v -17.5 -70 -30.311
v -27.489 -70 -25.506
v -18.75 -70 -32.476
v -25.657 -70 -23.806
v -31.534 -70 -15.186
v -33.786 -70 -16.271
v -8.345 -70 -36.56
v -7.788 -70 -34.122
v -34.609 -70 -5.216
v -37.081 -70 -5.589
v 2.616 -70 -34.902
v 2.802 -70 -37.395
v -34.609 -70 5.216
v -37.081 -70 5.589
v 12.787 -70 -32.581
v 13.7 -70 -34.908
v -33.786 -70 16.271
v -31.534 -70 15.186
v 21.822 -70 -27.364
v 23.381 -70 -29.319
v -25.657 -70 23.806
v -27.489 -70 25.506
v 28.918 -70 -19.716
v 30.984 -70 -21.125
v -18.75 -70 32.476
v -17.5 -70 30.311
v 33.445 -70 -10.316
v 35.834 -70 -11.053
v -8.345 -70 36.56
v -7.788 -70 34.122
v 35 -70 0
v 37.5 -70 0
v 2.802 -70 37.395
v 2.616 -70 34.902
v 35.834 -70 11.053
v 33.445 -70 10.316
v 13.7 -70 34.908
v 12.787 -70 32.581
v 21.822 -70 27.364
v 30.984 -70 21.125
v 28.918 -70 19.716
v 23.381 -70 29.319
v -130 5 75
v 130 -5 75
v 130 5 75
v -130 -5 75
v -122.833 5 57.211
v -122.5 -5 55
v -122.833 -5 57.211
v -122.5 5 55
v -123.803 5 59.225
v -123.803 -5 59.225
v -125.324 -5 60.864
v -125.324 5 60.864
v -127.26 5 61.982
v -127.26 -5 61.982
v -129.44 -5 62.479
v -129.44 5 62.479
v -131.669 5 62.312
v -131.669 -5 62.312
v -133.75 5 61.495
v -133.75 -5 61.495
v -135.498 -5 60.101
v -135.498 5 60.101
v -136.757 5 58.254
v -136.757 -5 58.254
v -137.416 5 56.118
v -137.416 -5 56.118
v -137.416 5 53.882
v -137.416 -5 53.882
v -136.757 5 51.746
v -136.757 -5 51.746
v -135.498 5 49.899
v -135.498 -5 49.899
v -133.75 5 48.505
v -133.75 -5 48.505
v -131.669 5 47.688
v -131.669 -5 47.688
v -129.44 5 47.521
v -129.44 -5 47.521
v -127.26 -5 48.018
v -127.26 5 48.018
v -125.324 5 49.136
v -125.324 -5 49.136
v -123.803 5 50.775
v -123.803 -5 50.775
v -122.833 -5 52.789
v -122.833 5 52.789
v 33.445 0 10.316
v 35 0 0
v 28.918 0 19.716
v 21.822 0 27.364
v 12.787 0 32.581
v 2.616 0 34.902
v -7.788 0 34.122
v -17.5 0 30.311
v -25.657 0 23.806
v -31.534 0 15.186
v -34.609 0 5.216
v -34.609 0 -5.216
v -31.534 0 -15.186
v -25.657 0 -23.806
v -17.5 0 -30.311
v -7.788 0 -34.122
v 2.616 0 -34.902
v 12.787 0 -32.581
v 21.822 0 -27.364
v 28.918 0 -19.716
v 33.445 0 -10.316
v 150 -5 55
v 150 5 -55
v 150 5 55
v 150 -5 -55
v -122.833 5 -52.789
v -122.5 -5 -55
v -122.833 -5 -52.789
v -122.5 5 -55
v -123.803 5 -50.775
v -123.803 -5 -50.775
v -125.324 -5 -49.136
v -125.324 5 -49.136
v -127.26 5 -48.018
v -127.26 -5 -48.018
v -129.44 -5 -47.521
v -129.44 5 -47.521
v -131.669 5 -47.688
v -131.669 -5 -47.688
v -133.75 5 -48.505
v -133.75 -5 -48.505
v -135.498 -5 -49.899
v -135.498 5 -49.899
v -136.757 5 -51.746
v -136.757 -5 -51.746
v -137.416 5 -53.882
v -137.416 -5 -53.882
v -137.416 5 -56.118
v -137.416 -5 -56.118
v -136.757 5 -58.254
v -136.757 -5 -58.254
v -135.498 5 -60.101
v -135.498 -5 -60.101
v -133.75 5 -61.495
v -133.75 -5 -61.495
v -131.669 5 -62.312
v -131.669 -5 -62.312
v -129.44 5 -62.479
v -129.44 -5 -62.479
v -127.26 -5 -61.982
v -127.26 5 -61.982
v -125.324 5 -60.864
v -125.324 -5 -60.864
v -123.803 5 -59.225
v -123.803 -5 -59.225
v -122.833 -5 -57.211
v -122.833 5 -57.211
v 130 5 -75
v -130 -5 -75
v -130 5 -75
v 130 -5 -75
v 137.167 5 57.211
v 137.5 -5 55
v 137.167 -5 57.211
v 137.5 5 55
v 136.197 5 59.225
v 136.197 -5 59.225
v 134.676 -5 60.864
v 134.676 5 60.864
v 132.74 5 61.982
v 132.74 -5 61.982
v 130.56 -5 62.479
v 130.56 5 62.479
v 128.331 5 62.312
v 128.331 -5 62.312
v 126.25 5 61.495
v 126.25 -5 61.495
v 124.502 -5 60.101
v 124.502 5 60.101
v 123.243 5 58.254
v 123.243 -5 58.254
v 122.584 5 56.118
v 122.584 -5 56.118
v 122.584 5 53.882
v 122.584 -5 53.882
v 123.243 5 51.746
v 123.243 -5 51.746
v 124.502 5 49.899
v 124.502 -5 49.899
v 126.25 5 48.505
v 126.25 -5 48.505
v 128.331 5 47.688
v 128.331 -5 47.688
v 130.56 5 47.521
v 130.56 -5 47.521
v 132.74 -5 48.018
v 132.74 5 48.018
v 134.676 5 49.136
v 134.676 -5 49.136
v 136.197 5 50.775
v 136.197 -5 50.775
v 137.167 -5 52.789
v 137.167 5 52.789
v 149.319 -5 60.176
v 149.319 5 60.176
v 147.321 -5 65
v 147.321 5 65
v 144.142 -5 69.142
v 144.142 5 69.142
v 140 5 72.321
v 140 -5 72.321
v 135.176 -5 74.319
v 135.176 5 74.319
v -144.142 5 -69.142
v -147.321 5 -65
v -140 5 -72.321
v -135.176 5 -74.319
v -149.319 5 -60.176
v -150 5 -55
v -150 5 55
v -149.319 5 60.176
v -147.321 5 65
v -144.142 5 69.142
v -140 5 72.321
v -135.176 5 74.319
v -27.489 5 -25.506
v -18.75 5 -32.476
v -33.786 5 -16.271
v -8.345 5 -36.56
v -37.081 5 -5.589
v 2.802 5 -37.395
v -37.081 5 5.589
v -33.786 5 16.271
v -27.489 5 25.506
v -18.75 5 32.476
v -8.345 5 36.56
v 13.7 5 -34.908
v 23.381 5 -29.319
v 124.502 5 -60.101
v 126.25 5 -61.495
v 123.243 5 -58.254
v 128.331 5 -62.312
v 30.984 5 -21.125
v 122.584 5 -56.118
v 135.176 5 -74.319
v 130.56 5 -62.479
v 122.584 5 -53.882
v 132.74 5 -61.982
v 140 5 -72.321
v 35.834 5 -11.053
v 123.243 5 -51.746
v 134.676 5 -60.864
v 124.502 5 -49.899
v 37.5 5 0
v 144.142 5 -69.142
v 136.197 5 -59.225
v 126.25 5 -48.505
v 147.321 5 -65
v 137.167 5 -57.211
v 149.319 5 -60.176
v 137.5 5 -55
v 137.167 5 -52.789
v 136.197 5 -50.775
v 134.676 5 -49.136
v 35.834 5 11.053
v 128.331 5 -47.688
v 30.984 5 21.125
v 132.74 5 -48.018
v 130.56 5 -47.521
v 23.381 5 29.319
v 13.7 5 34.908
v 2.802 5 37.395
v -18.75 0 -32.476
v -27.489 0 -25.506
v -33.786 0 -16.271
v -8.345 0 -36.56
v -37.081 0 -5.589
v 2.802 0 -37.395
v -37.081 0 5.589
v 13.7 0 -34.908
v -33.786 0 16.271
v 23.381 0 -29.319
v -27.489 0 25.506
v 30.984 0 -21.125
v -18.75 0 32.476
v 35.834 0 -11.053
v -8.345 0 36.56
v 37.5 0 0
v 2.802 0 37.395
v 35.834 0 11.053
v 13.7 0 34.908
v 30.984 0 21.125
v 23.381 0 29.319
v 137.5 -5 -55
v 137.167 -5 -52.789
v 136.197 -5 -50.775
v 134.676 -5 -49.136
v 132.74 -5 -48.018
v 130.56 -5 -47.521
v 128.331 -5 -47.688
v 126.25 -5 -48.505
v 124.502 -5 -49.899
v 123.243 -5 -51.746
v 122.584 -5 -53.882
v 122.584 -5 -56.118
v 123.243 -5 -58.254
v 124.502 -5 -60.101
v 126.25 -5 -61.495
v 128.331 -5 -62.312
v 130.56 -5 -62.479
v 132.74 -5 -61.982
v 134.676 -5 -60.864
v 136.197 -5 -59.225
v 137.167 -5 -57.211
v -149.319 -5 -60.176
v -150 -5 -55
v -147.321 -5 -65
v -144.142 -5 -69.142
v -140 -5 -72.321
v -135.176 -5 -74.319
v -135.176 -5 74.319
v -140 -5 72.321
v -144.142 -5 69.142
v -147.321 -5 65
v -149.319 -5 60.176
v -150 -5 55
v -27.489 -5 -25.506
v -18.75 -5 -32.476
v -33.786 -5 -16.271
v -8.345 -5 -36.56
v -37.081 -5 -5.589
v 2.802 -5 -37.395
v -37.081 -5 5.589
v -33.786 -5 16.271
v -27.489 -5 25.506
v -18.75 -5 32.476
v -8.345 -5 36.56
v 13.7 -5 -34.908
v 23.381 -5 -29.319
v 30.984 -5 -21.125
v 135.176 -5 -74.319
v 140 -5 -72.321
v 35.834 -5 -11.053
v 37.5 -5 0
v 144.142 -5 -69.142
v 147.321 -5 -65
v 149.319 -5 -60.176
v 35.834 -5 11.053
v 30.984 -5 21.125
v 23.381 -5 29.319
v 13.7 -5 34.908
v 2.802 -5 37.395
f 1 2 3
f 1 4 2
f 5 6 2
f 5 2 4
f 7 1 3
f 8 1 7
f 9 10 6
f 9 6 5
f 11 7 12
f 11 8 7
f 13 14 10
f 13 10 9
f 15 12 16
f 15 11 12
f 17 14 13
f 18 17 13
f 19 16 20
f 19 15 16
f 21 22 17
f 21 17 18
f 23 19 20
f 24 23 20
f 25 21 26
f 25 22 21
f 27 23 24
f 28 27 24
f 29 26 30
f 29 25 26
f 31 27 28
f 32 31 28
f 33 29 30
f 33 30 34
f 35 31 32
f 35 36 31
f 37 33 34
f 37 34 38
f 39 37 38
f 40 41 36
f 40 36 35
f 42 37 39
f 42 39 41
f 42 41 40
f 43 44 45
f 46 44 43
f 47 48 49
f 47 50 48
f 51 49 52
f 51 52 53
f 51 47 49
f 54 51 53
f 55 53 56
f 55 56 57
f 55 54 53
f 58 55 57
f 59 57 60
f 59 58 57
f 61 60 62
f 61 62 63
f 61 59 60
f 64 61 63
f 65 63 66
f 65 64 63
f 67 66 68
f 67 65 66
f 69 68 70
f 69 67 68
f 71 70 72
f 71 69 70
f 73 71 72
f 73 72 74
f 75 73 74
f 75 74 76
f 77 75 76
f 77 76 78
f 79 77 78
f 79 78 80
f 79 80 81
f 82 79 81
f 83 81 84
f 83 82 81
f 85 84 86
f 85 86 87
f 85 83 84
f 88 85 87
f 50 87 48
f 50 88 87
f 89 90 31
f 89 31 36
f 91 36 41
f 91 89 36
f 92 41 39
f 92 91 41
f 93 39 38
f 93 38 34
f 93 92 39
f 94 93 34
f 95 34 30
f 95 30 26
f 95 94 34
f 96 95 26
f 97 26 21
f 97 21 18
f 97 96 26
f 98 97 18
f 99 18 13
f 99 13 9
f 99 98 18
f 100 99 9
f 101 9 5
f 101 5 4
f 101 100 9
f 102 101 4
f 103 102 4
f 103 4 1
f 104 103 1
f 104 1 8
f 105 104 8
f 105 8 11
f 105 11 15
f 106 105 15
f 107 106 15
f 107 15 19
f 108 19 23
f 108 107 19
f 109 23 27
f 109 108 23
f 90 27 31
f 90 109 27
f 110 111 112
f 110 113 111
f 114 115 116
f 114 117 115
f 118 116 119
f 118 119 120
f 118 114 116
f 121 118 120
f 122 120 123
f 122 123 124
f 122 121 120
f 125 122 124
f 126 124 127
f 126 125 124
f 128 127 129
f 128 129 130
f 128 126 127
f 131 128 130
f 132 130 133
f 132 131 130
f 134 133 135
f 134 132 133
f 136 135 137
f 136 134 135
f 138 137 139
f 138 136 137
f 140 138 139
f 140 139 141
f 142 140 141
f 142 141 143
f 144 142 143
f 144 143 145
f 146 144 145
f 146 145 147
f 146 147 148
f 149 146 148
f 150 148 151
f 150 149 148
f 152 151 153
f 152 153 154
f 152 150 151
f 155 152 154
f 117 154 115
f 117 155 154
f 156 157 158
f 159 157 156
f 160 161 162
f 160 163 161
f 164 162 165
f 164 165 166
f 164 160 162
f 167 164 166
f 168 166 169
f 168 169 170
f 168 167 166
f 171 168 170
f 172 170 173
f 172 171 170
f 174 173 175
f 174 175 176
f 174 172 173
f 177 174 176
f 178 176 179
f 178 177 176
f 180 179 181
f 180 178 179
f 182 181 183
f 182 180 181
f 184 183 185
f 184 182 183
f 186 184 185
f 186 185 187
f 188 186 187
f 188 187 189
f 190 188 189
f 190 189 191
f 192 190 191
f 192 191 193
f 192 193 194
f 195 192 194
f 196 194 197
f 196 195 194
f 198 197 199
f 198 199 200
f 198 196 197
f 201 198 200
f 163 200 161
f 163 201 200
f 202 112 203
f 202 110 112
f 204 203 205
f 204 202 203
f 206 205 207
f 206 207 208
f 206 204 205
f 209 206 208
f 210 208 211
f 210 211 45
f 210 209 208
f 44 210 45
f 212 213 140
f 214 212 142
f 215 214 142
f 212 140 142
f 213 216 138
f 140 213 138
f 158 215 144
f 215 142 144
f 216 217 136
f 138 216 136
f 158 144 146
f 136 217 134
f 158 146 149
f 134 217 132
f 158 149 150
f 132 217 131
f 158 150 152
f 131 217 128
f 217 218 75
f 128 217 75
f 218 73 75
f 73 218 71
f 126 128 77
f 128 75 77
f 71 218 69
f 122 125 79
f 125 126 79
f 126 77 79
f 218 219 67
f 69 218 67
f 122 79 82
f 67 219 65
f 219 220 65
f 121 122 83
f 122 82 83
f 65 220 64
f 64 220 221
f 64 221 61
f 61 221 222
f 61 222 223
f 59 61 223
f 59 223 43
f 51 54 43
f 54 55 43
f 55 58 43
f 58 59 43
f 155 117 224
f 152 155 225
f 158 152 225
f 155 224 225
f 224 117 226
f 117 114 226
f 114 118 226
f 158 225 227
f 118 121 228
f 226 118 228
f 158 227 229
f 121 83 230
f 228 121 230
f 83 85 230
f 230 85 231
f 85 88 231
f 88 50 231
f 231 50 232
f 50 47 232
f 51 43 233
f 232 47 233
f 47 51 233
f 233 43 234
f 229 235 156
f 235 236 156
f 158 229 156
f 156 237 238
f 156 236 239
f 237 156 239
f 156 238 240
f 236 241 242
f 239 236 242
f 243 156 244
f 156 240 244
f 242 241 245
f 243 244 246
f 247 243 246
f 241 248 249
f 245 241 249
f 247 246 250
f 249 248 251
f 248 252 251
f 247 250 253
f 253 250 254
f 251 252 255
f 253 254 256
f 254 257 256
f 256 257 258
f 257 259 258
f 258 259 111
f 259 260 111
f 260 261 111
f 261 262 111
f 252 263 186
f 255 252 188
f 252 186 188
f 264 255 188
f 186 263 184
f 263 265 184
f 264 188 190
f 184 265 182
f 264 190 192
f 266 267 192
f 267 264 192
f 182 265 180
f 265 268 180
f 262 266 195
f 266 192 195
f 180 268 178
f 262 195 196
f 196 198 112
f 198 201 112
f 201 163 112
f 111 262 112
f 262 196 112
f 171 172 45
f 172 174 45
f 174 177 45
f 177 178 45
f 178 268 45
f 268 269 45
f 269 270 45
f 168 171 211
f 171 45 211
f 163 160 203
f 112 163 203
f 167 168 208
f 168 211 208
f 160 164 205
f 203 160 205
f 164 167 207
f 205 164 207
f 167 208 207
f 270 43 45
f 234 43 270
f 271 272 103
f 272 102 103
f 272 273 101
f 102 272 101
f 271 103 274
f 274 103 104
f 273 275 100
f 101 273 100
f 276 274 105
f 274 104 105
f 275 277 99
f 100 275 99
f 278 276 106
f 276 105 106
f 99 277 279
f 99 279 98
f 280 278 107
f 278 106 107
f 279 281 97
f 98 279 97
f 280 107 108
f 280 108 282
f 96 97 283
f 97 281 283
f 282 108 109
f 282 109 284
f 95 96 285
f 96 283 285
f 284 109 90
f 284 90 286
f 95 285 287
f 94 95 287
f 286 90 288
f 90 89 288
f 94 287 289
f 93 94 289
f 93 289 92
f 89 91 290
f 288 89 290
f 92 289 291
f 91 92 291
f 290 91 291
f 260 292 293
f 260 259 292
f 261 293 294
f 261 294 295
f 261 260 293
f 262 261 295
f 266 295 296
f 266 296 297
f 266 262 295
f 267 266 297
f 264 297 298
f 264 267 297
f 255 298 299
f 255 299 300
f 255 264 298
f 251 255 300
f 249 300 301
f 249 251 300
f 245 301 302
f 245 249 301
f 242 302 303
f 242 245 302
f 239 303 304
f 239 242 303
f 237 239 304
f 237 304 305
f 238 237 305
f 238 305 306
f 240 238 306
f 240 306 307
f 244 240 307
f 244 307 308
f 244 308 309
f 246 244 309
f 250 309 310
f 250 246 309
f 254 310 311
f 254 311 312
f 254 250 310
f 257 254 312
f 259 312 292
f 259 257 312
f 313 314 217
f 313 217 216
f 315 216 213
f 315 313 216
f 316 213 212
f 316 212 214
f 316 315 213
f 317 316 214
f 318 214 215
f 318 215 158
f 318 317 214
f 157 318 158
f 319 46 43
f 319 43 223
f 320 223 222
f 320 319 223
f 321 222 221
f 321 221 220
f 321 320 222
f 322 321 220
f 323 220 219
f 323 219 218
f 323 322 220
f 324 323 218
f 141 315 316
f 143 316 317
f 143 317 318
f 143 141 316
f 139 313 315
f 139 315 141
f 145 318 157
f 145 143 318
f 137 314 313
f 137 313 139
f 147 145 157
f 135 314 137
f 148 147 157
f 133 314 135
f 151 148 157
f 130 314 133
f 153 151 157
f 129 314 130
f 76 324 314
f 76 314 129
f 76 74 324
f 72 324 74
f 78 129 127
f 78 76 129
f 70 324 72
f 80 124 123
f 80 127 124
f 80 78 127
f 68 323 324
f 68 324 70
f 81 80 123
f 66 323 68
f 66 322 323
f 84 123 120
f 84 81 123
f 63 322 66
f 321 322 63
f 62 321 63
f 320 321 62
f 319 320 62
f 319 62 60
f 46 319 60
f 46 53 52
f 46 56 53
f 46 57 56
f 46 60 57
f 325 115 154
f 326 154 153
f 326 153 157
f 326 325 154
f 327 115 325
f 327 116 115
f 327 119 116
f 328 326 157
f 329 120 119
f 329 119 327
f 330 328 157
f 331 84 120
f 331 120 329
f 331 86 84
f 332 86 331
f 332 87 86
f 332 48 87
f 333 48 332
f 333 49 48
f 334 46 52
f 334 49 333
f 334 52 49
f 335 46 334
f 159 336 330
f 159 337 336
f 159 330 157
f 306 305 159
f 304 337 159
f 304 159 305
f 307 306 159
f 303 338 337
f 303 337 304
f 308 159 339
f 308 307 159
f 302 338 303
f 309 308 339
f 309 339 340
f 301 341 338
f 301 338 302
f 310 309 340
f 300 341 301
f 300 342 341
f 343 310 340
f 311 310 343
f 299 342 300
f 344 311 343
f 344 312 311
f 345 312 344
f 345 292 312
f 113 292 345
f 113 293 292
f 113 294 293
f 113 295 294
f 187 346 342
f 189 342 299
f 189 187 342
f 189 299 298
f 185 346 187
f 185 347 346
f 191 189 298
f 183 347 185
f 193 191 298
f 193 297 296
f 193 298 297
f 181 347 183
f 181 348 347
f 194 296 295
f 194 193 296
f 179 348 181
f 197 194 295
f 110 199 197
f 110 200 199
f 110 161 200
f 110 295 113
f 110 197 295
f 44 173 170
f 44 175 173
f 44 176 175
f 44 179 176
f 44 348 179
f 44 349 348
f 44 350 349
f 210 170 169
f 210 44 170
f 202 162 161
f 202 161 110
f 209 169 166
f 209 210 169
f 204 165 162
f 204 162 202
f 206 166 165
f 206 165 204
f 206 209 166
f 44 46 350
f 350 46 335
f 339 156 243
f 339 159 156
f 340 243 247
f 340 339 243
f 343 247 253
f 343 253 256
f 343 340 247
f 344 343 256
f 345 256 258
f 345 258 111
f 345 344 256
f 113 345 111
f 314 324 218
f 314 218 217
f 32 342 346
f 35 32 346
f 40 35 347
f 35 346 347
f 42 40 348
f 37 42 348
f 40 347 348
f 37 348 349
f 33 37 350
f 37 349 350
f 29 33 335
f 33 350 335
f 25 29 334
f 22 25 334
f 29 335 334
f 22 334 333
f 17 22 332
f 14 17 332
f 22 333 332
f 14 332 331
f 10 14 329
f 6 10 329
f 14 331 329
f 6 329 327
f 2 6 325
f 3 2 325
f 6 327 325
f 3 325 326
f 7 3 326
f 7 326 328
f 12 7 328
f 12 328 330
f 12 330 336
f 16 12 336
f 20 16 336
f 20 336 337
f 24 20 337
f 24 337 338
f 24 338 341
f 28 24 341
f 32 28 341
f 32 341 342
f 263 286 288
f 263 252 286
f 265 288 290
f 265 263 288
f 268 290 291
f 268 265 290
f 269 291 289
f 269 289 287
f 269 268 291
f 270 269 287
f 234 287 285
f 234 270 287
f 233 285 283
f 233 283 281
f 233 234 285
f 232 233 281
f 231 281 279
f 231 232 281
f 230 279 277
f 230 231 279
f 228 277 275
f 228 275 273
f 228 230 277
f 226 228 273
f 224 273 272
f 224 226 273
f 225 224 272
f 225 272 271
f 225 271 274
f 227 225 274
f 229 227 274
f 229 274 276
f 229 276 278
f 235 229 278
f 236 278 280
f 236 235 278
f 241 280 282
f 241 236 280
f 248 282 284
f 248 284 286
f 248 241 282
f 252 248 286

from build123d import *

# Parameters (mm, degrees)
F0_R     = 7.5
F0_R_2   = 37.5
F1_DEPTH = 5
F0_R_3   = 35
F2_DEPTH = 70


with BuildPart() as f1:
    # F0 (on Front) → F1 (new body, symmetric)
    with BuildSketch(Plane.XZ):
        with BuildLine():
            ThreePointArc((150, 55), (144.1421356237, 69.1421356237), (130, 75))
            Line((130, 75), (-130, 75))
            ThreePointArc((-130, 75), (-144.1421356237, 69.1421356237), (-150, 55))
            Line((-150, 55), (-150, -55))
            ThreePointArc((-150, -55), (-144.1421356237, -69.1421356237), (-130, -75))
            Line((-130, -75), (130, -75))
            ThreePointArc((130, -75), (144.1421356237, -69.1421356237), (150, -55))
            Line((150, -55), (150, 55))
        make_face()
        with Locations((-130, -55)):
            Circle(F0_R, mode=Mode.SUBTRACT)
        with Locations((130, -55)):
            Circle(F0_R, mode=Mode.SUBTRACT)
        with Locations((-130, 55)):
            Circle(F0_R, mode=Mode.SUBTRACT)
        Circle(F0_R_2, mode=Mode.SUBTRACT)
        with Locations((130, 55)):
            Circle(F0_R, mode=Mode.SUBTRACT)
    extrude(amount=F1_DEPTH, both=True)

    # F0 (on Front) → F2 (join)
    with BuildSketch(Plane.XZ):
        Circle(F0_R_2)
        Circle(F0_R_3, mode=Mode.SUBTRACT)
    extrude(amount=F2_DEPTH)


solid = f1.part
